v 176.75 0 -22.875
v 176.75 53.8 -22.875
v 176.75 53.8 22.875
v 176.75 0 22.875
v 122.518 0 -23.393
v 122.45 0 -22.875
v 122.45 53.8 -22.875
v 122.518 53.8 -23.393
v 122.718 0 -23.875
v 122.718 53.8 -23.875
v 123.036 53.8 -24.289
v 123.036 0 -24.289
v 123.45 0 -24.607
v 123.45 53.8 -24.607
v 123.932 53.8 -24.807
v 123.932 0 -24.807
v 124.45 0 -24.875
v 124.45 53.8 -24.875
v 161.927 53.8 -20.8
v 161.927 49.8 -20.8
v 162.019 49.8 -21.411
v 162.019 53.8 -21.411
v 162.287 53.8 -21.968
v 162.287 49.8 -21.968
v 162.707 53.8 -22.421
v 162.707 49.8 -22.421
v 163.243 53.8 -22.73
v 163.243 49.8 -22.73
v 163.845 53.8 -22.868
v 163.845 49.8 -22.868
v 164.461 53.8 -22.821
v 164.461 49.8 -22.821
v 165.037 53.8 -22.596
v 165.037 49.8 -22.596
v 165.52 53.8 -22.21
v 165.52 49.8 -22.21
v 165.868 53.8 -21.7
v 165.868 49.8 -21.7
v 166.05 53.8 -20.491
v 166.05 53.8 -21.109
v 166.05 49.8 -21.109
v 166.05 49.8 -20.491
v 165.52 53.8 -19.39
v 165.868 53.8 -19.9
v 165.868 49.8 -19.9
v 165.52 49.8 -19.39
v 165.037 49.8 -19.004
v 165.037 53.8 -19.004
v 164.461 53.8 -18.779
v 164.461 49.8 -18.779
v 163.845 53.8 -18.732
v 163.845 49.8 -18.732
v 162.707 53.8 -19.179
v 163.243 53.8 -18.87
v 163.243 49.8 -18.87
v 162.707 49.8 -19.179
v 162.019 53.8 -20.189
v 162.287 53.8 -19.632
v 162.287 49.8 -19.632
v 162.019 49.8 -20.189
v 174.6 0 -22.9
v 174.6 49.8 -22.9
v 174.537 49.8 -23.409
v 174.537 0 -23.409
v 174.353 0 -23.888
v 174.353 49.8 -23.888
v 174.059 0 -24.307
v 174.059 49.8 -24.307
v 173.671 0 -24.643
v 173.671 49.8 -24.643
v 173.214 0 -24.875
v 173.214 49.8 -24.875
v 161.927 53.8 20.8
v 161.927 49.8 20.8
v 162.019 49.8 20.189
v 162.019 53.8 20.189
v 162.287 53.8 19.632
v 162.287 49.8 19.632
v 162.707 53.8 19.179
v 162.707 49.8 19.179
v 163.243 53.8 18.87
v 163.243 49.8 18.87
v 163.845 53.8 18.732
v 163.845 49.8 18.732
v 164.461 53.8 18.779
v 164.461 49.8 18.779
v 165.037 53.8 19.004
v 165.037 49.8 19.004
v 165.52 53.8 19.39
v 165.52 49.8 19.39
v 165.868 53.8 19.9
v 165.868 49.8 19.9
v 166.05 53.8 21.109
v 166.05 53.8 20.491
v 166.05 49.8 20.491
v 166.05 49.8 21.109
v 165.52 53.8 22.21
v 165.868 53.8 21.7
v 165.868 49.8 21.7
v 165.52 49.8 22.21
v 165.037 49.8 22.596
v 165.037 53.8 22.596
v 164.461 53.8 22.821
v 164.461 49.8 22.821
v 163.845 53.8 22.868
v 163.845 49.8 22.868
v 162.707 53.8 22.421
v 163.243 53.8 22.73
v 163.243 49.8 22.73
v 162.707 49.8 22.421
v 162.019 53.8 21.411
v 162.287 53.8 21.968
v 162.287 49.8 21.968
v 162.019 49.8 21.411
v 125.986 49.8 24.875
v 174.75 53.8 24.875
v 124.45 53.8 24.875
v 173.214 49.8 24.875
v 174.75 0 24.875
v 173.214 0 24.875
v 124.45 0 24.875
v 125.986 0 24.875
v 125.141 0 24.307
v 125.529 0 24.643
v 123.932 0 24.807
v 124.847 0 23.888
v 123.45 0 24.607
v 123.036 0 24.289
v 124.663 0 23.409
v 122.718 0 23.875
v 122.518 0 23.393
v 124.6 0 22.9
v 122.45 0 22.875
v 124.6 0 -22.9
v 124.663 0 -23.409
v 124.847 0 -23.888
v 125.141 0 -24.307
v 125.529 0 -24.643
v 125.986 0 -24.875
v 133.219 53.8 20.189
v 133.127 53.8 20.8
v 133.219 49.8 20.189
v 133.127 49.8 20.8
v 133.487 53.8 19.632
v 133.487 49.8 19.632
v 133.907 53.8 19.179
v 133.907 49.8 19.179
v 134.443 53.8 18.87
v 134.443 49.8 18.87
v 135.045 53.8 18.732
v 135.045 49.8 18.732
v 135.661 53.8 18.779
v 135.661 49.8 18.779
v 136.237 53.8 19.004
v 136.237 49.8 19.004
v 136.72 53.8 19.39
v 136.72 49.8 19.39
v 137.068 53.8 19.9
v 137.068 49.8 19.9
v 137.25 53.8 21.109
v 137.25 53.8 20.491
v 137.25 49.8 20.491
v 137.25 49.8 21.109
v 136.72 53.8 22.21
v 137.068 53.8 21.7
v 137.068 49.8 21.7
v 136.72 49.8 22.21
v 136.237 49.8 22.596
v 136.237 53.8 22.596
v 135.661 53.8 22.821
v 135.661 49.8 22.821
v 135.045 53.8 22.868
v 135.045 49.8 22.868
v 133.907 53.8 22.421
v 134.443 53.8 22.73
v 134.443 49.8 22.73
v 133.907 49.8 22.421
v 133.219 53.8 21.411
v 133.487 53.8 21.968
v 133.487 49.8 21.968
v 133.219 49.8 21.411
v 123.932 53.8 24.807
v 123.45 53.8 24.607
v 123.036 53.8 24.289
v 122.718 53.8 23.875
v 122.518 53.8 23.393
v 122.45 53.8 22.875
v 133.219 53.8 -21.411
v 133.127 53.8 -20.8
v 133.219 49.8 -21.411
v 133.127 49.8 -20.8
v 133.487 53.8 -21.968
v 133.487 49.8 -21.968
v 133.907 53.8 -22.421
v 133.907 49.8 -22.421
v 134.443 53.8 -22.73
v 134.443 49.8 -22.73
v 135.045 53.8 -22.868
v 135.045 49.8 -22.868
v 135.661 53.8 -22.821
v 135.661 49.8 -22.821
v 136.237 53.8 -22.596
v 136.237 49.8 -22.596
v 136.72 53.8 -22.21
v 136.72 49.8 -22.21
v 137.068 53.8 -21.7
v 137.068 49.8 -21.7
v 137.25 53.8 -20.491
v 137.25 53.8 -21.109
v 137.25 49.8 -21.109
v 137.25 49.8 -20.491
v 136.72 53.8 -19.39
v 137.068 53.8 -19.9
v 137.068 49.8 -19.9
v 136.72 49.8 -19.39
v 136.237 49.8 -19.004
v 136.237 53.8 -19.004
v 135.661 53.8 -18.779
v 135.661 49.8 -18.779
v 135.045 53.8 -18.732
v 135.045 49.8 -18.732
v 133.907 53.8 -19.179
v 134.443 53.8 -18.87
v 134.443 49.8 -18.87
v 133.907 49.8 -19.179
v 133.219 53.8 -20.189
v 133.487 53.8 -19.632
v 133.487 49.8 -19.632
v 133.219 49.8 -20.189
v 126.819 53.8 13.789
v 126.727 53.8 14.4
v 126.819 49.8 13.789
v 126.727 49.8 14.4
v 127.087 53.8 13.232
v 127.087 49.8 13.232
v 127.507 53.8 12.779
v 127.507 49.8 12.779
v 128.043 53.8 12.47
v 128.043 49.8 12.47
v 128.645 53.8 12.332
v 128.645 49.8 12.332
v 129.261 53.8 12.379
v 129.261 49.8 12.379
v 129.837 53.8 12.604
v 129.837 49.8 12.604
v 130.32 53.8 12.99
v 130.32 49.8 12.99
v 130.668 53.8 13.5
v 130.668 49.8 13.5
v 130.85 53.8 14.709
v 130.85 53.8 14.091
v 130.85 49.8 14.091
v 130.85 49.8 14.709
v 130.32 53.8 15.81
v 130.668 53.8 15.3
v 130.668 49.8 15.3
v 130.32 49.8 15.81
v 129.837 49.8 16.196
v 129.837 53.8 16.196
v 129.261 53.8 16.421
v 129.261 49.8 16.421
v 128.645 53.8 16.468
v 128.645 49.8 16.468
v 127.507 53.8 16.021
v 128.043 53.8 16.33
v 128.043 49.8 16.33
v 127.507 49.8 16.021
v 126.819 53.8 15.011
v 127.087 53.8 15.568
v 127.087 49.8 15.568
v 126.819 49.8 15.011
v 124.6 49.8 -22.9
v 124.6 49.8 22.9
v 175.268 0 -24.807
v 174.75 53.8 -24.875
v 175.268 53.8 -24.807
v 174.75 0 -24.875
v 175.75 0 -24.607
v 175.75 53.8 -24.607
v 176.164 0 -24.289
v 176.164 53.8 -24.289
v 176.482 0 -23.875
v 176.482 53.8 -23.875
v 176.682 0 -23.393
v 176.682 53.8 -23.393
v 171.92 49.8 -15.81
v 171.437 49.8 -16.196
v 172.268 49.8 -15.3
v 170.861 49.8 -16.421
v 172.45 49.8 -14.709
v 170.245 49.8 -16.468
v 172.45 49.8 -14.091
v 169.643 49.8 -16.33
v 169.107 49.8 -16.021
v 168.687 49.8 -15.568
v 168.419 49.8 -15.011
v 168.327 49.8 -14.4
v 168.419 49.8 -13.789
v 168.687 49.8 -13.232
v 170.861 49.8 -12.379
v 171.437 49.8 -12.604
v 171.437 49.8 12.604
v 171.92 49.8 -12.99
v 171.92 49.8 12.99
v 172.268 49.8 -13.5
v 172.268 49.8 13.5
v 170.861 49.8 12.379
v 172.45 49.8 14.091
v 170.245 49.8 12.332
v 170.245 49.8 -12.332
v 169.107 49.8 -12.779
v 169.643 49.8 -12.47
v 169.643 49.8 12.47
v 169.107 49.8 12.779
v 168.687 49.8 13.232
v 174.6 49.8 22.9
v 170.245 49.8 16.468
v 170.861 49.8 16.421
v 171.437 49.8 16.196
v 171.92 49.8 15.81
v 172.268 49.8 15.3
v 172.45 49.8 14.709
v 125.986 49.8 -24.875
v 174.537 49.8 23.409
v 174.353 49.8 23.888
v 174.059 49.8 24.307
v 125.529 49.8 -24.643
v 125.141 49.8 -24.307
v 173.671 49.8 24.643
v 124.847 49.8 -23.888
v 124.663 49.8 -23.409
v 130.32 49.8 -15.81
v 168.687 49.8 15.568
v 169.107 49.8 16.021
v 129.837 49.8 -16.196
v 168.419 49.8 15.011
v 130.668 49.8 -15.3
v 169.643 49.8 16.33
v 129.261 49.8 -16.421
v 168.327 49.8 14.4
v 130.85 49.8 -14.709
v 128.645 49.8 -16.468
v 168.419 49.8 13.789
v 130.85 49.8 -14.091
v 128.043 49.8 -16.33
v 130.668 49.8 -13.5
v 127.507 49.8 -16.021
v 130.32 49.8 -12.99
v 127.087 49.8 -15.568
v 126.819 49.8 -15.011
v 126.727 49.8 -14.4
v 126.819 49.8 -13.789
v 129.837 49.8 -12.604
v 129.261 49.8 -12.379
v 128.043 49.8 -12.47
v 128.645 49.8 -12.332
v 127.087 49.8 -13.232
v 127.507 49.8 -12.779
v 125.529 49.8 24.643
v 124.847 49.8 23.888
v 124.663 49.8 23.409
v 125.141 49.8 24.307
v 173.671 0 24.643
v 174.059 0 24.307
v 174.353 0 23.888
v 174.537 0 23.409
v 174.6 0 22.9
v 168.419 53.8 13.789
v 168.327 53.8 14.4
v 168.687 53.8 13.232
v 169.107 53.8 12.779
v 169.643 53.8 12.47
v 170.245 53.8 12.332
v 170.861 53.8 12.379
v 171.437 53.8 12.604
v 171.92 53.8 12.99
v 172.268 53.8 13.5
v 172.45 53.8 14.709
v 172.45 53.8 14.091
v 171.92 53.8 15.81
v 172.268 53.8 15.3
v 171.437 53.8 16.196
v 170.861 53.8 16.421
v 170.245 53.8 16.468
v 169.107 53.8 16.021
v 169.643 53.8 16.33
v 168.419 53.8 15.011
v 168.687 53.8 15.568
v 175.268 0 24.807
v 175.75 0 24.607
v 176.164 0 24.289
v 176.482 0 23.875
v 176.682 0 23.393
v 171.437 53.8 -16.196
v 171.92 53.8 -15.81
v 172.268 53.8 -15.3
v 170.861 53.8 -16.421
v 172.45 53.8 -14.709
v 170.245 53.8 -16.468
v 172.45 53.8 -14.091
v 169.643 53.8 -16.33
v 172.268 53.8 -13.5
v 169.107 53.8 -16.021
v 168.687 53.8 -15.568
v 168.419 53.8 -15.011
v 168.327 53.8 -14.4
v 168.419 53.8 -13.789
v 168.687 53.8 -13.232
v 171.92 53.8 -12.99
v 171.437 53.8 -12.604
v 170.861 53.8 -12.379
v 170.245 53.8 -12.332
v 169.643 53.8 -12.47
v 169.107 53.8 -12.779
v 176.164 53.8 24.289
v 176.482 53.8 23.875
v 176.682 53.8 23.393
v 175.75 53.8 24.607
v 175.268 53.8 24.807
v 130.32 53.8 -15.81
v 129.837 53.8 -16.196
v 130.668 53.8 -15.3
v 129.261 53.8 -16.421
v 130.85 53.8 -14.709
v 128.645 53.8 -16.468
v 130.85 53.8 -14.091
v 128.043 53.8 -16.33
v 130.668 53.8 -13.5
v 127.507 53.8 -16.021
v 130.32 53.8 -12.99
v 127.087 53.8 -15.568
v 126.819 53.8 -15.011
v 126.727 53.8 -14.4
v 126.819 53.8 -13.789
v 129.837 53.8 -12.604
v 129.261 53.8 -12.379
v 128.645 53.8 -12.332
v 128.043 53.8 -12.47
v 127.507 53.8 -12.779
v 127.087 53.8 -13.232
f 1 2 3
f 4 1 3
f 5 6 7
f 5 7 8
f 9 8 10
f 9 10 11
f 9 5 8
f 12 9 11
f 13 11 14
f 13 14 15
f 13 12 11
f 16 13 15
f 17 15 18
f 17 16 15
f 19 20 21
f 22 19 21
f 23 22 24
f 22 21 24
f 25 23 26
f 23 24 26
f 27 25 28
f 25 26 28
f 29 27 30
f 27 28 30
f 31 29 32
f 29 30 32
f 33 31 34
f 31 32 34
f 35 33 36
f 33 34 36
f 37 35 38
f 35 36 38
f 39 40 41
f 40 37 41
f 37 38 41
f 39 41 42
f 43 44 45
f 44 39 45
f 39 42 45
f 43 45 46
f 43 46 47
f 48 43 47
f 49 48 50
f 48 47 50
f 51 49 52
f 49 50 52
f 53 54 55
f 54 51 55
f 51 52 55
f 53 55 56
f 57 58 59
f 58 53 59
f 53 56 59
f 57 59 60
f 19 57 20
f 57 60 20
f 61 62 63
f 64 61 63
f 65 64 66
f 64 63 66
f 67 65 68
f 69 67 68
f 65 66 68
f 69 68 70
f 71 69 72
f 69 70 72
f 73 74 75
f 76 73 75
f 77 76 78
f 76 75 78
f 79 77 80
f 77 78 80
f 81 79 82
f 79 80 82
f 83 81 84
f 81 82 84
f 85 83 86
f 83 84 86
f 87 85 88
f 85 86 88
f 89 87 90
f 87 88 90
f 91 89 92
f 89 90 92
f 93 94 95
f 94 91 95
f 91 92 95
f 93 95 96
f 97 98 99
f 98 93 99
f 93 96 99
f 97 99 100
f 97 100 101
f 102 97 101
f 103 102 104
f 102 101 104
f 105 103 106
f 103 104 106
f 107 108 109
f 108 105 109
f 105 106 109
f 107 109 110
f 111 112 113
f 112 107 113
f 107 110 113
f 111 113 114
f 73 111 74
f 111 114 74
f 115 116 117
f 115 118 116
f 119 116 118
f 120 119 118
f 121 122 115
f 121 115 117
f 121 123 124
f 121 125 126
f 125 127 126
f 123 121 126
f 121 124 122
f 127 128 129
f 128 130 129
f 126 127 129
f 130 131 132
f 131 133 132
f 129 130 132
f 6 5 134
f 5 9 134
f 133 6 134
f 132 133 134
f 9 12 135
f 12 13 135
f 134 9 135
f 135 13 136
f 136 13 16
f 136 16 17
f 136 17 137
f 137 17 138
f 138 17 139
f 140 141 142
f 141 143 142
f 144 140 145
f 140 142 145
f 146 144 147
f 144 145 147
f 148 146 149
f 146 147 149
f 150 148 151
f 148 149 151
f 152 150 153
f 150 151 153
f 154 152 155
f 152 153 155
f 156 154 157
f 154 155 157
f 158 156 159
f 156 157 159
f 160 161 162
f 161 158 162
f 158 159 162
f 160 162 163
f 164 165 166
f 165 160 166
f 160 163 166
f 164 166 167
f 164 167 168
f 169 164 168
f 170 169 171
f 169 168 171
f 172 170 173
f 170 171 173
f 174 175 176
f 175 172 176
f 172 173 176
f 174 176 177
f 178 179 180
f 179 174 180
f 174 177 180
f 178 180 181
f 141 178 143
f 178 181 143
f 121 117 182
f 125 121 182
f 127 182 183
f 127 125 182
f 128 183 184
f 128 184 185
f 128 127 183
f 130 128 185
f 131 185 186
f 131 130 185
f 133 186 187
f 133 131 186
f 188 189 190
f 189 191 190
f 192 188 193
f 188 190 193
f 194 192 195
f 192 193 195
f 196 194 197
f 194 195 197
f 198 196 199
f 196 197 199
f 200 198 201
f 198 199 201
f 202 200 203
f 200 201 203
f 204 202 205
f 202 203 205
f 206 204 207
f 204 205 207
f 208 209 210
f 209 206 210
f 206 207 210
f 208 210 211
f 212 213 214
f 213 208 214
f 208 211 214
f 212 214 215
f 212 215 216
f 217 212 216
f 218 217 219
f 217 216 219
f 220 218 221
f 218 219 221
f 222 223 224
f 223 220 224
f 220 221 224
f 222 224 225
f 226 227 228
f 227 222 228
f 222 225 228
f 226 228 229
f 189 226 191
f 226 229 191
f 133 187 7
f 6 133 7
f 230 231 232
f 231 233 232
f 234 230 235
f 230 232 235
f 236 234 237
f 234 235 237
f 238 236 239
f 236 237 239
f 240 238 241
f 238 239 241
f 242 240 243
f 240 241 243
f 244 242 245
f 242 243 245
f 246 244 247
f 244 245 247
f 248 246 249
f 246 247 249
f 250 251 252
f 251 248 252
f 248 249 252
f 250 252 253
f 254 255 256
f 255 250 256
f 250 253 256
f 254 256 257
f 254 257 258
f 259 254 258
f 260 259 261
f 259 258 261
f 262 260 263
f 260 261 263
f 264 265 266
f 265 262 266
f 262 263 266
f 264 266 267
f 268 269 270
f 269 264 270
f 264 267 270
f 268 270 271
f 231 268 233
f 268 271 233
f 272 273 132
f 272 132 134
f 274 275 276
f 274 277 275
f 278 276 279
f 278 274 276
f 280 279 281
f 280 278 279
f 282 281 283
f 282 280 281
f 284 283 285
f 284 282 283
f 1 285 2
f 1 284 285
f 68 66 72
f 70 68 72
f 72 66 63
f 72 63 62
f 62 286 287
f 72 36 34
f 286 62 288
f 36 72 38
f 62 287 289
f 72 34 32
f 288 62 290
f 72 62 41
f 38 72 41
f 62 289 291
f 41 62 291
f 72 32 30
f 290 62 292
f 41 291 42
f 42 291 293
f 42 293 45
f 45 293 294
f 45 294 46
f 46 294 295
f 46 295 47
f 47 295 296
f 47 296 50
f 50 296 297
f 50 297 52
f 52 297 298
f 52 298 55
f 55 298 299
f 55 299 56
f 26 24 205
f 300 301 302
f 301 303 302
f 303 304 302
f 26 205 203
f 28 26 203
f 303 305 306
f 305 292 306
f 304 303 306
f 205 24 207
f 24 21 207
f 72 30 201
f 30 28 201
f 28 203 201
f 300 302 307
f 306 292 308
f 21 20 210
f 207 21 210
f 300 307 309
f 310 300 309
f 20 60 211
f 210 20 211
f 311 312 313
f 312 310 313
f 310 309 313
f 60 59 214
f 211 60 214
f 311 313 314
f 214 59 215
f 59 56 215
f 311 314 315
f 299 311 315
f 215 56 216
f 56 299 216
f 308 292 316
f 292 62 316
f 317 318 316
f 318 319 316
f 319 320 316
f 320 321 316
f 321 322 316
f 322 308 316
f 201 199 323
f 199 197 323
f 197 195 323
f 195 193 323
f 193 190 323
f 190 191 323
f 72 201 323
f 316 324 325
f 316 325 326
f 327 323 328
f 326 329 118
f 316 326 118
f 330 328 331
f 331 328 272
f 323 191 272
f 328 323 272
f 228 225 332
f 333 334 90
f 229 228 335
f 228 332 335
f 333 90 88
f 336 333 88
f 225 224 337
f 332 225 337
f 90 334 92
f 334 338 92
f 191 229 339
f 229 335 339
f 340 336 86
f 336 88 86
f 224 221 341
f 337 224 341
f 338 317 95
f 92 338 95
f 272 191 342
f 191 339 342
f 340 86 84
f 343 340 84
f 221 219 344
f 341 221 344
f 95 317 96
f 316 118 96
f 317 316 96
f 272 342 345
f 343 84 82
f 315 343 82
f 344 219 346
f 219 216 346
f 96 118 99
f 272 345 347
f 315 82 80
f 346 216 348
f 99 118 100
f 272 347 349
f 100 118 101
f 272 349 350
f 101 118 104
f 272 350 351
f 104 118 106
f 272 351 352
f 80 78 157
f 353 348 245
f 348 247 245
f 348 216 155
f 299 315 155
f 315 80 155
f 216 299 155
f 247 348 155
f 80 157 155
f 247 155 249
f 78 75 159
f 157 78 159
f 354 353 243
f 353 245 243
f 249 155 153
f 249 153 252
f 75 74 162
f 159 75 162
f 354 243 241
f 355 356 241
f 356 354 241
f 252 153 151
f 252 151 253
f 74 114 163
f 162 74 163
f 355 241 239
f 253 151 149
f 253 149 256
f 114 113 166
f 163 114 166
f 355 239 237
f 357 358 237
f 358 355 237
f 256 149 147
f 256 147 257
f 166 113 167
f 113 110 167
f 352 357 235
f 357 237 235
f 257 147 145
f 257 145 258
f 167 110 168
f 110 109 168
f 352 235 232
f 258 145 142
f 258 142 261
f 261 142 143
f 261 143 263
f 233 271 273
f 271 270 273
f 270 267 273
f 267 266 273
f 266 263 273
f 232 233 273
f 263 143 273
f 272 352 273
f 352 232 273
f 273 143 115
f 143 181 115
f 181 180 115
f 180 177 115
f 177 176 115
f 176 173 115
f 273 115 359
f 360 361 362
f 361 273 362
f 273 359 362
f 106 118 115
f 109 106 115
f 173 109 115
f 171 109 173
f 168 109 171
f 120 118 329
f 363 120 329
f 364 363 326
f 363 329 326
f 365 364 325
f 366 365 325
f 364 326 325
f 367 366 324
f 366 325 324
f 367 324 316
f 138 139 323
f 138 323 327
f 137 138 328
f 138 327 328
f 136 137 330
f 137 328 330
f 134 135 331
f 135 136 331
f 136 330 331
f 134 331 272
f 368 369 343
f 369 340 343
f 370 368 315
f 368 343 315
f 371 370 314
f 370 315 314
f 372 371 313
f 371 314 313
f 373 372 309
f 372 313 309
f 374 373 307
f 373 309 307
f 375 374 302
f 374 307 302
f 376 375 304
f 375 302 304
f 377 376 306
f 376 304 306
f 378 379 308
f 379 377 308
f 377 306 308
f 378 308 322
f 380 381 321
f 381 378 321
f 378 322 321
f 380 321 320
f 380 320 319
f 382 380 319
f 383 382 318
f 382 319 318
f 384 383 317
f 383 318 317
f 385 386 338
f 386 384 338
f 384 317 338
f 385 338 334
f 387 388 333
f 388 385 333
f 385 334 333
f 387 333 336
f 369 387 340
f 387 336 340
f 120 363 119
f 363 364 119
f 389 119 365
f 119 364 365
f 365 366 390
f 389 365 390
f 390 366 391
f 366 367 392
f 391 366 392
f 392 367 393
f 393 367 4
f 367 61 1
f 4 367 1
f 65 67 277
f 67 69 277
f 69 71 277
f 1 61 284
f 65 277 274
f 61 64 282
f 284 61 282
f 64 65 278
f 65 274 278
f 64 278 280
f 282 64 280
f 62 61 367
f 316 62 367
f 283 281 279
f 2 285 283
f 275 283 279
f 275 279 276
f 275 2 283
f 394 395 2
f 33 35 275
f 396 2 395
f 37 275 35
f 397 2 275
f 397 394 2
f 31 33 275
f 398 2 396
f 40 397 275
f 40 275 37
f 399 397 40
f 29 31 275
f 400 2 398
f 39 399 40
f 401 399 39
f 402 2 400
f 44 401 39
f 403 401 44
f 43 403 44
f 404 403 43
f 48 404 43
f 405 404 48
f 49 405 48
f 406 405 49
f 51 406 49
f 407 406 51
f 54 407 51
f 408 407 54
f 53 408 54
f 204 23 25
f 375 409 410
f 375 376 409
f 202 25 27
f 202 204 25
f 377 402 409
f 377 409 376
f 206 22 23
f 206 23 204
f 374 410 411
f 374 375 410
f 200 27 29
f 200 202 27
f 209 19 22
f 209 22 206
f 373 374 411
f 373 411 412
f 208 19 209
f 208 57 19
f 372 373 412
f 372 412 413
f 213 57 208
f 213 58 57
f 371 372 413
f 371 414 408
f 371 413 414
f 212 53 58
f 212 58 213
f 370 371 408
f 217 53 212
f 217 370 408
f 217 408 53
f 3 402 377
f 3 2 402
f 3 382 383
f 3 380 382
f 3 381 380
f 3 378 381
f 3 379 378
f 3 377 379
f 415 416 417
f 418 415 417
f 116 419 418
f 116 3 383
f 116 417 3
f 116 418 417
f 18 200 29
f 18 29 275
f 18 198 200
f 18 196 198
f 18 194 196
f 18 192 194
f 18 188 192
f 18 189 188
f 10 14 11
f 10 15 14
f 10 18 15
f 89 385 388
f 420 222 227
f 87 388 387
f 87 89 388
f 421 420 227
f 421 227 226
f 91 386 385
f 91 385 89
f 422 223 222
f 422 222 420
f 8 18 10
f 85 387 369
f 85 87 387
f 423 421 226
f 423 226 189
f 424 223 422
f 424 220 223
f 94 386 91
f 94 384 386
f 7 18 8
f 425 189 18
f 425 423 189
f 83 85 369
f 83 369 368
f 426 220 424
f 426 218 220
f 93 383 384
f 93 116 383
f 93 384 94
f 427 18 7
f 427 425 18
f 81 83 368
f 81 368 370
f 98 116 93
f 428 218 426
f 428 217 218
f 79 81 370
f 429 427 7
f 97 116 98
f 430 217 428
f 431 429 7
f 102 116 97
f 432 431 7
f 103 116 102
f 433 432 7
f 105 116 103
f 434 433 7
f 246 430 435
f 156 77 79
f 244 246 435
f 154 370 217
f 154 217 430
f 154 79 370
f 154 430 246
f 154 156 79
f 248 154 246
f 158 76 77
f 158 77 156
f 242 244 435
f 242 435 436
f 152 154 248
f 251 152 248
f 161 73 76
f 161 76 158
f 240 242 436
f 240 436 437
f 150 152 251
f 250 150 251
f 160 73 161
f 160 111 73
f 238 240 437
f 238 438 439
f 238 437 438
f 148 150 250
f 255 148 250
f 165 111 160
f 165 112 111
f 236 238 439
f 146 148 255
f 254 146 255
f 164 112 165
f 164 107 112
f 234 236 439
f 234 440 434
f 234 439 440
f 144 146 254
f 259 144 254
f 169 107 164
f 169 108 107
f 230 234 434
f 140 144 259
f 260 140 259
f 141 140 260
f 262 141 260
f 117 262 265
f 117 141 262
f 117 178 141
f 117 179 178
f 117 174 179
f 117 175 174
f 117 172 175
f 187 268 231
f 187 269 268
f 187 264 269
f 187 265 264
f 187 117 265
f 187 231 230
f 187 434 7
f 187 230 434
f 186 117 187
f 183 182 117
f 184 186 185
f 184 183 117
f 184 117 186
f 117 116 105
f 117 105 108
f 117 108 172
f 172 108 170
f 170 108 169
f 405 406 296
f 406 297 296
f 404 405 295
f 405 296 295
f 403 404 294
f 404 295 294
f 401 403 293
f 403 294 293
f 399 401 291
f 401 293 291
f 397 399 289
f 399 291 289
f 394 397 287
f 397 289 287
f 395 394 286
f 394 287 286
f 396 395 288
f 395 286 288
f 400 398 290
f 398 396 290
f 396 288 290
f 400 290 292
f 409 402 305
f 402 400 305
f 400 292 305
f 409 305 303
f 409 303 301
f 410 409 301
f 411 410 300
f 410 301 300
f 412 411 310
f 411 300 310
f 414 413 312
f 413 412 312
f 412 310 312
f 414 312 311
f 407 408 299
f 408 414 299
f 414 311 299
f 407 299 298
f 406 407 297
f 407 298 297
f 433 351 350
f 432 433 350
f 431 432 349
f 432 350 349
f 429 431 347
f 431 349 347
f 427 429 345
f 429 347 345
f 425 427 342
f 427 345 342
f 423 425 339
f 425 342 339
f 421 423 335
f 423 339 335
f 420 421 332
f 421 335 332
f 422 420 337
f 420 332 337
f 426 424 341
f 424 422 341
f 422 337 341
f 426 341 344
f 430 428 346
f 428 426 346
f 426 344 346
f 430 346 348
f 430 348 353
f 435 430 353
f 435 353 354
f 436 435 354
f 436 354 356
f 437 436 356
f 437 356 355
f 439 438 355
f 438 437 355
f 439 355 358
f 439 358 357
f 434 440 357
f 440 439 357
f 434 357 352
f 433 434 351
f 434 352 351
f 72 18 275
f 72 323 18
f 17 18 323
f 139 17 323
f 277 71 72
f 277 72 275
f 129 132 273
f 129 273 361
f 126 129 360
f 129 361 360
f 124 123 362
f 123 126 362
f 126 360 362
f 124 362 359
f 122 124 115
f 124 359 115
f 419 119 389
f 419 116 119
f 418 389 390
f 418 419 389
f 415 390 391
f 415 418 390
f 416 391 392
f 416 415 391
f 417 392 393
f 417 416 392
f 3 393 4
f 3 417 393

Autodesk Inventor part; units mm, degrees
ref_plane "YZ Plane" through (0, 0, 0) normal (1, 0, 0) x (0, 1, 0)
sketch "Sketch1" plane through (0, 0, 0) normal (0, 1, 0) x (-1, 0, 0)
  line L0 (-155.225, -15) -> (-155.225, 15) projected
  line L1 (-155.225, 15) -> (-147.725, 15) projected
  line L2 (-147.725, 15) -> (-147.725, -15) projected
  line L3 (-147.725, -15) -> (-155.225, -15) projected
  circle A0 centre (-171.5, -21.9) radius 1.875 projected
  circle A1 centre (-127.7, 21.9) radius 1.875 projected
  circle A2 centre (-127.7, -21.9) radius 1.875 projected
  circle A3 centre (-171.5, 21.9) radius 1.875 projected
  circle A4 centre (-135.2, 20.8) radius 2.0734 projected
  circle A5 centre (-164, -20.8) radius 2.0734 projected
  circle A6 centre (-135.2, -20.8) radius 2.0734 projected
  circle A7 centre (-128.8, -14.4) radius 2.0734 projected
  circle A8 centre (-128.8, 14.4) radius 2.0734 projected
  circle A9 centre (-164, 20.8) radius 2.0734 projected
  circle A10 centre (-170.4, -14.4) radius 2.0734 projected
  circle A11 centre (-170.4, 14.4) radius 2.0734 projected
  line L4 (-172.5, 24.875) -> (-126.7, 24.875) projected
  arc A12 (-172.5, 24.875) -> (-174.475, 22.9) centre (-172.5, 22.9) ccw projected
  line L5 (-174.475, -22.9) -> (-174.475, 22.9) projected
  arc A13 (-174.475, -22.9) -> (-172.5, -24.875) centre (-172.5, -22.9) ccw projected
  line L6 (-126.7, -24.875) -> (-172.5, -24.875) projected
  arc A14 (-126.7, -24.875) -> (-124.725, -22.9) centre (-126.7, -22.9) ccw projected
  line L7 (-124.725, 22.9) -> (-124.725, -22.9) projected
  arc A15 (-124.725, 22.9) -> (-126.7, 24.875) centre (-126.7, 22.9) ccw projected
  point P0 (0, 0)
ref_plane "Work Plane1" through (124.725, 49.8, -24.875) normal (0, 1, 0) x (0, 0, 1)
extrude "Extrusion1" add sketch "Sketch1" along normal blind 4 from surface at 49.8 contours L0 L1 L2 L3 | A0 | A1 | A2 | A3 | L4 A15 L7 A14 L6 A13 L5 A12
sketch "Sketch2" plane through (126.7, 53.8, -24.875) normal (0, 1, 0) x (1, 0, 0)
  circle A0 centre (8.5, -45.675) radius 2.0734 projected
  circle A1 centre (37.3, -4.075) radius 2.0734 projected
  circle A2 centre (8.5, -4.075) radius 2.0734 projected
  circle A3 centre (2.1, -10.475) radius 2.0734 projected
  circle A4 centre (2.1, -39.275) radius 2.0734 projected
  circle A5 centre (37.3, -45.675) radius 2.0734 projected
  circle A6 centre (43.7, -10.475) radius 2.0734 projected
  circle A7 centre (43.7, -39.275) radius 2.0734 projected
  arc A8 (47.775, -1.975) -> (45.8, 0) centre (45.8, -1.975) ccw projected
  line L0 (0, 0) -> (45.8, 0) projected
  arc A9 (0, 0) -> (-1.975, -1.975) centre (0, -1.975) ccw projected
  line L1 (-1.975, -47.775) -> (-1.975, -1.975) projected
  arc A10 (-1.975, -47.775) -> (0, -49.75) centre (0, -47.775) ccw projected
  line L2 (45.8, -49.75) -> (0, -49.75) projected
  arc A11 (45.8, -49.75) -> (47.775, -47.775) centre (45.8, -47.775) ccw projected
  line L3 (47.775, -1.975) -> (47.775, -47.775) projected
  line L4 (16.025, -44.875) -> (33.525, -44.875)
  line L5 (33.525, -44.875) -> (33.525, -4.875)
  line L6 (33.525, -4.875) -> (16.025, -4.875)
  line L7 (16.025, -4.875) -> (16.025, -44.875)
  line L8 (45.8, 0) -> (50.05, 0)
  line L9 (50.05, 0) -> (50.05, -49.75)
  line L10 (50.05, -49.75) -> (45.8, -49.75)
  line L11 (45.8, -49.75) -> (45.8, 0)
  line L12 (50.05, -49.75) -> (47.925, -49.75)
  line L13 (47.925, -49.75) -> (47.925, 0)
  line L14 (47.925, 0) -> (50.05, 0)
  line L15 (50.05, 0) -> (50.05, -49.75)
  arc A12 (45.8, -49.875) -> (47.9, -47.775) centre (45.8, -47.775) ccw
  line L16 (45.8, -49.875) -> (0, -49.875)
  arc A13 (-2.1, -47.775) -> (0, -49.875) centre (0, -47.775) ccw
  line L17 (-2.1, -47.775) -> (-2.1, -1.975)
  arc A14 (0, 0.125) -> (-2.1, -1.975) centre (0, -1.975) ccw
  line L18 (0, 0.125) -> (45.8, 0.125)
  arc A15 (47.9, -1.975) -> (45.8, 0.125) centre (45.8, -1.975) ccw
  line L19 (47.9, -1.975) -> (47.9, -47.775)
  point P0 (-126.7, -24.875)
  point P1 (47.925, -49.75)
  point P2 (46.5137, -49.75)
  point P3 (46.5137, 0)
  dimension "d3" = 4.25
  dimension "d4" = 2.125
  dimension "d15" = 0.125
extrude "Extrusion2" [suppressed]
extrude "Extrusion3" add sketch "Sketch2" against normal up to surface (4 mm away) contours A8 L8 A15 L19 A12 L10 A11 L3 | L8 L13 L10 A12 L19 A15 | L8 L9 L10 L13
extrude "Extrusion4" add sketch "Sketch2" against normal blind 49.8 from surface at -4 contours L8 L13 L10 A12 L19 A15 | L8 L9 L10 L13
fillet "Fillet1" radius 2 2 edges at (176.75, 26.9, 24.875) (176.75, 26.9, -24.875)
sketch "Sketch3" plane through (176.75, 53.8, 22.875) normal (1, 0, 0) x (0, 0, -1)
  line L0 (7.875, -21.425) -> (7.875, -28.925) projected
  line L1 (7.875, -28.925) -> (37.875, -28.925) projected
  line L2 (37.875, -28.925) -> (37.875, -21.425) projected
  line L3 (37.875, -21.425) -> (7.875, -21.425) projected
  line L4 (5.825, -9.7) -> (39.925, -9.7) projected
  line L5 (39.925, -44.1) -> (39.925, -9.7) projected
  line L6 (5.825, -44.1) -> (39.925, -44.1) projected
  line L7 (5.825, -9.7) -> (5.825, -44.1) projected
  line L8 (2.875, -16.425) -> (2.875, -33.925)
  line L9 (2.875, -33.925) -> (42.875, -33.925)
  line L10 (42.875, -33.925) -> (42.875, -16.425)
  line L11 (42.875, -16.425) -> (2.875, -16.425)
  point P0 (22.875, -53.8)
  dimension "d12" = 5
extrude "Extrusion5" [suppressed]
ref_plane "Work Plane2" through (149.6, 49.8, -22.9) normal (-1, 0, 0) x (0, 0, 1)
mirror "Mirror1" about plane through (149.6, 49.8, -22.9) normal (-1, 0, 0) of "Extrusion3", "Extrusion4", "Fillet1"
properties part number "Outer Cover Full"
